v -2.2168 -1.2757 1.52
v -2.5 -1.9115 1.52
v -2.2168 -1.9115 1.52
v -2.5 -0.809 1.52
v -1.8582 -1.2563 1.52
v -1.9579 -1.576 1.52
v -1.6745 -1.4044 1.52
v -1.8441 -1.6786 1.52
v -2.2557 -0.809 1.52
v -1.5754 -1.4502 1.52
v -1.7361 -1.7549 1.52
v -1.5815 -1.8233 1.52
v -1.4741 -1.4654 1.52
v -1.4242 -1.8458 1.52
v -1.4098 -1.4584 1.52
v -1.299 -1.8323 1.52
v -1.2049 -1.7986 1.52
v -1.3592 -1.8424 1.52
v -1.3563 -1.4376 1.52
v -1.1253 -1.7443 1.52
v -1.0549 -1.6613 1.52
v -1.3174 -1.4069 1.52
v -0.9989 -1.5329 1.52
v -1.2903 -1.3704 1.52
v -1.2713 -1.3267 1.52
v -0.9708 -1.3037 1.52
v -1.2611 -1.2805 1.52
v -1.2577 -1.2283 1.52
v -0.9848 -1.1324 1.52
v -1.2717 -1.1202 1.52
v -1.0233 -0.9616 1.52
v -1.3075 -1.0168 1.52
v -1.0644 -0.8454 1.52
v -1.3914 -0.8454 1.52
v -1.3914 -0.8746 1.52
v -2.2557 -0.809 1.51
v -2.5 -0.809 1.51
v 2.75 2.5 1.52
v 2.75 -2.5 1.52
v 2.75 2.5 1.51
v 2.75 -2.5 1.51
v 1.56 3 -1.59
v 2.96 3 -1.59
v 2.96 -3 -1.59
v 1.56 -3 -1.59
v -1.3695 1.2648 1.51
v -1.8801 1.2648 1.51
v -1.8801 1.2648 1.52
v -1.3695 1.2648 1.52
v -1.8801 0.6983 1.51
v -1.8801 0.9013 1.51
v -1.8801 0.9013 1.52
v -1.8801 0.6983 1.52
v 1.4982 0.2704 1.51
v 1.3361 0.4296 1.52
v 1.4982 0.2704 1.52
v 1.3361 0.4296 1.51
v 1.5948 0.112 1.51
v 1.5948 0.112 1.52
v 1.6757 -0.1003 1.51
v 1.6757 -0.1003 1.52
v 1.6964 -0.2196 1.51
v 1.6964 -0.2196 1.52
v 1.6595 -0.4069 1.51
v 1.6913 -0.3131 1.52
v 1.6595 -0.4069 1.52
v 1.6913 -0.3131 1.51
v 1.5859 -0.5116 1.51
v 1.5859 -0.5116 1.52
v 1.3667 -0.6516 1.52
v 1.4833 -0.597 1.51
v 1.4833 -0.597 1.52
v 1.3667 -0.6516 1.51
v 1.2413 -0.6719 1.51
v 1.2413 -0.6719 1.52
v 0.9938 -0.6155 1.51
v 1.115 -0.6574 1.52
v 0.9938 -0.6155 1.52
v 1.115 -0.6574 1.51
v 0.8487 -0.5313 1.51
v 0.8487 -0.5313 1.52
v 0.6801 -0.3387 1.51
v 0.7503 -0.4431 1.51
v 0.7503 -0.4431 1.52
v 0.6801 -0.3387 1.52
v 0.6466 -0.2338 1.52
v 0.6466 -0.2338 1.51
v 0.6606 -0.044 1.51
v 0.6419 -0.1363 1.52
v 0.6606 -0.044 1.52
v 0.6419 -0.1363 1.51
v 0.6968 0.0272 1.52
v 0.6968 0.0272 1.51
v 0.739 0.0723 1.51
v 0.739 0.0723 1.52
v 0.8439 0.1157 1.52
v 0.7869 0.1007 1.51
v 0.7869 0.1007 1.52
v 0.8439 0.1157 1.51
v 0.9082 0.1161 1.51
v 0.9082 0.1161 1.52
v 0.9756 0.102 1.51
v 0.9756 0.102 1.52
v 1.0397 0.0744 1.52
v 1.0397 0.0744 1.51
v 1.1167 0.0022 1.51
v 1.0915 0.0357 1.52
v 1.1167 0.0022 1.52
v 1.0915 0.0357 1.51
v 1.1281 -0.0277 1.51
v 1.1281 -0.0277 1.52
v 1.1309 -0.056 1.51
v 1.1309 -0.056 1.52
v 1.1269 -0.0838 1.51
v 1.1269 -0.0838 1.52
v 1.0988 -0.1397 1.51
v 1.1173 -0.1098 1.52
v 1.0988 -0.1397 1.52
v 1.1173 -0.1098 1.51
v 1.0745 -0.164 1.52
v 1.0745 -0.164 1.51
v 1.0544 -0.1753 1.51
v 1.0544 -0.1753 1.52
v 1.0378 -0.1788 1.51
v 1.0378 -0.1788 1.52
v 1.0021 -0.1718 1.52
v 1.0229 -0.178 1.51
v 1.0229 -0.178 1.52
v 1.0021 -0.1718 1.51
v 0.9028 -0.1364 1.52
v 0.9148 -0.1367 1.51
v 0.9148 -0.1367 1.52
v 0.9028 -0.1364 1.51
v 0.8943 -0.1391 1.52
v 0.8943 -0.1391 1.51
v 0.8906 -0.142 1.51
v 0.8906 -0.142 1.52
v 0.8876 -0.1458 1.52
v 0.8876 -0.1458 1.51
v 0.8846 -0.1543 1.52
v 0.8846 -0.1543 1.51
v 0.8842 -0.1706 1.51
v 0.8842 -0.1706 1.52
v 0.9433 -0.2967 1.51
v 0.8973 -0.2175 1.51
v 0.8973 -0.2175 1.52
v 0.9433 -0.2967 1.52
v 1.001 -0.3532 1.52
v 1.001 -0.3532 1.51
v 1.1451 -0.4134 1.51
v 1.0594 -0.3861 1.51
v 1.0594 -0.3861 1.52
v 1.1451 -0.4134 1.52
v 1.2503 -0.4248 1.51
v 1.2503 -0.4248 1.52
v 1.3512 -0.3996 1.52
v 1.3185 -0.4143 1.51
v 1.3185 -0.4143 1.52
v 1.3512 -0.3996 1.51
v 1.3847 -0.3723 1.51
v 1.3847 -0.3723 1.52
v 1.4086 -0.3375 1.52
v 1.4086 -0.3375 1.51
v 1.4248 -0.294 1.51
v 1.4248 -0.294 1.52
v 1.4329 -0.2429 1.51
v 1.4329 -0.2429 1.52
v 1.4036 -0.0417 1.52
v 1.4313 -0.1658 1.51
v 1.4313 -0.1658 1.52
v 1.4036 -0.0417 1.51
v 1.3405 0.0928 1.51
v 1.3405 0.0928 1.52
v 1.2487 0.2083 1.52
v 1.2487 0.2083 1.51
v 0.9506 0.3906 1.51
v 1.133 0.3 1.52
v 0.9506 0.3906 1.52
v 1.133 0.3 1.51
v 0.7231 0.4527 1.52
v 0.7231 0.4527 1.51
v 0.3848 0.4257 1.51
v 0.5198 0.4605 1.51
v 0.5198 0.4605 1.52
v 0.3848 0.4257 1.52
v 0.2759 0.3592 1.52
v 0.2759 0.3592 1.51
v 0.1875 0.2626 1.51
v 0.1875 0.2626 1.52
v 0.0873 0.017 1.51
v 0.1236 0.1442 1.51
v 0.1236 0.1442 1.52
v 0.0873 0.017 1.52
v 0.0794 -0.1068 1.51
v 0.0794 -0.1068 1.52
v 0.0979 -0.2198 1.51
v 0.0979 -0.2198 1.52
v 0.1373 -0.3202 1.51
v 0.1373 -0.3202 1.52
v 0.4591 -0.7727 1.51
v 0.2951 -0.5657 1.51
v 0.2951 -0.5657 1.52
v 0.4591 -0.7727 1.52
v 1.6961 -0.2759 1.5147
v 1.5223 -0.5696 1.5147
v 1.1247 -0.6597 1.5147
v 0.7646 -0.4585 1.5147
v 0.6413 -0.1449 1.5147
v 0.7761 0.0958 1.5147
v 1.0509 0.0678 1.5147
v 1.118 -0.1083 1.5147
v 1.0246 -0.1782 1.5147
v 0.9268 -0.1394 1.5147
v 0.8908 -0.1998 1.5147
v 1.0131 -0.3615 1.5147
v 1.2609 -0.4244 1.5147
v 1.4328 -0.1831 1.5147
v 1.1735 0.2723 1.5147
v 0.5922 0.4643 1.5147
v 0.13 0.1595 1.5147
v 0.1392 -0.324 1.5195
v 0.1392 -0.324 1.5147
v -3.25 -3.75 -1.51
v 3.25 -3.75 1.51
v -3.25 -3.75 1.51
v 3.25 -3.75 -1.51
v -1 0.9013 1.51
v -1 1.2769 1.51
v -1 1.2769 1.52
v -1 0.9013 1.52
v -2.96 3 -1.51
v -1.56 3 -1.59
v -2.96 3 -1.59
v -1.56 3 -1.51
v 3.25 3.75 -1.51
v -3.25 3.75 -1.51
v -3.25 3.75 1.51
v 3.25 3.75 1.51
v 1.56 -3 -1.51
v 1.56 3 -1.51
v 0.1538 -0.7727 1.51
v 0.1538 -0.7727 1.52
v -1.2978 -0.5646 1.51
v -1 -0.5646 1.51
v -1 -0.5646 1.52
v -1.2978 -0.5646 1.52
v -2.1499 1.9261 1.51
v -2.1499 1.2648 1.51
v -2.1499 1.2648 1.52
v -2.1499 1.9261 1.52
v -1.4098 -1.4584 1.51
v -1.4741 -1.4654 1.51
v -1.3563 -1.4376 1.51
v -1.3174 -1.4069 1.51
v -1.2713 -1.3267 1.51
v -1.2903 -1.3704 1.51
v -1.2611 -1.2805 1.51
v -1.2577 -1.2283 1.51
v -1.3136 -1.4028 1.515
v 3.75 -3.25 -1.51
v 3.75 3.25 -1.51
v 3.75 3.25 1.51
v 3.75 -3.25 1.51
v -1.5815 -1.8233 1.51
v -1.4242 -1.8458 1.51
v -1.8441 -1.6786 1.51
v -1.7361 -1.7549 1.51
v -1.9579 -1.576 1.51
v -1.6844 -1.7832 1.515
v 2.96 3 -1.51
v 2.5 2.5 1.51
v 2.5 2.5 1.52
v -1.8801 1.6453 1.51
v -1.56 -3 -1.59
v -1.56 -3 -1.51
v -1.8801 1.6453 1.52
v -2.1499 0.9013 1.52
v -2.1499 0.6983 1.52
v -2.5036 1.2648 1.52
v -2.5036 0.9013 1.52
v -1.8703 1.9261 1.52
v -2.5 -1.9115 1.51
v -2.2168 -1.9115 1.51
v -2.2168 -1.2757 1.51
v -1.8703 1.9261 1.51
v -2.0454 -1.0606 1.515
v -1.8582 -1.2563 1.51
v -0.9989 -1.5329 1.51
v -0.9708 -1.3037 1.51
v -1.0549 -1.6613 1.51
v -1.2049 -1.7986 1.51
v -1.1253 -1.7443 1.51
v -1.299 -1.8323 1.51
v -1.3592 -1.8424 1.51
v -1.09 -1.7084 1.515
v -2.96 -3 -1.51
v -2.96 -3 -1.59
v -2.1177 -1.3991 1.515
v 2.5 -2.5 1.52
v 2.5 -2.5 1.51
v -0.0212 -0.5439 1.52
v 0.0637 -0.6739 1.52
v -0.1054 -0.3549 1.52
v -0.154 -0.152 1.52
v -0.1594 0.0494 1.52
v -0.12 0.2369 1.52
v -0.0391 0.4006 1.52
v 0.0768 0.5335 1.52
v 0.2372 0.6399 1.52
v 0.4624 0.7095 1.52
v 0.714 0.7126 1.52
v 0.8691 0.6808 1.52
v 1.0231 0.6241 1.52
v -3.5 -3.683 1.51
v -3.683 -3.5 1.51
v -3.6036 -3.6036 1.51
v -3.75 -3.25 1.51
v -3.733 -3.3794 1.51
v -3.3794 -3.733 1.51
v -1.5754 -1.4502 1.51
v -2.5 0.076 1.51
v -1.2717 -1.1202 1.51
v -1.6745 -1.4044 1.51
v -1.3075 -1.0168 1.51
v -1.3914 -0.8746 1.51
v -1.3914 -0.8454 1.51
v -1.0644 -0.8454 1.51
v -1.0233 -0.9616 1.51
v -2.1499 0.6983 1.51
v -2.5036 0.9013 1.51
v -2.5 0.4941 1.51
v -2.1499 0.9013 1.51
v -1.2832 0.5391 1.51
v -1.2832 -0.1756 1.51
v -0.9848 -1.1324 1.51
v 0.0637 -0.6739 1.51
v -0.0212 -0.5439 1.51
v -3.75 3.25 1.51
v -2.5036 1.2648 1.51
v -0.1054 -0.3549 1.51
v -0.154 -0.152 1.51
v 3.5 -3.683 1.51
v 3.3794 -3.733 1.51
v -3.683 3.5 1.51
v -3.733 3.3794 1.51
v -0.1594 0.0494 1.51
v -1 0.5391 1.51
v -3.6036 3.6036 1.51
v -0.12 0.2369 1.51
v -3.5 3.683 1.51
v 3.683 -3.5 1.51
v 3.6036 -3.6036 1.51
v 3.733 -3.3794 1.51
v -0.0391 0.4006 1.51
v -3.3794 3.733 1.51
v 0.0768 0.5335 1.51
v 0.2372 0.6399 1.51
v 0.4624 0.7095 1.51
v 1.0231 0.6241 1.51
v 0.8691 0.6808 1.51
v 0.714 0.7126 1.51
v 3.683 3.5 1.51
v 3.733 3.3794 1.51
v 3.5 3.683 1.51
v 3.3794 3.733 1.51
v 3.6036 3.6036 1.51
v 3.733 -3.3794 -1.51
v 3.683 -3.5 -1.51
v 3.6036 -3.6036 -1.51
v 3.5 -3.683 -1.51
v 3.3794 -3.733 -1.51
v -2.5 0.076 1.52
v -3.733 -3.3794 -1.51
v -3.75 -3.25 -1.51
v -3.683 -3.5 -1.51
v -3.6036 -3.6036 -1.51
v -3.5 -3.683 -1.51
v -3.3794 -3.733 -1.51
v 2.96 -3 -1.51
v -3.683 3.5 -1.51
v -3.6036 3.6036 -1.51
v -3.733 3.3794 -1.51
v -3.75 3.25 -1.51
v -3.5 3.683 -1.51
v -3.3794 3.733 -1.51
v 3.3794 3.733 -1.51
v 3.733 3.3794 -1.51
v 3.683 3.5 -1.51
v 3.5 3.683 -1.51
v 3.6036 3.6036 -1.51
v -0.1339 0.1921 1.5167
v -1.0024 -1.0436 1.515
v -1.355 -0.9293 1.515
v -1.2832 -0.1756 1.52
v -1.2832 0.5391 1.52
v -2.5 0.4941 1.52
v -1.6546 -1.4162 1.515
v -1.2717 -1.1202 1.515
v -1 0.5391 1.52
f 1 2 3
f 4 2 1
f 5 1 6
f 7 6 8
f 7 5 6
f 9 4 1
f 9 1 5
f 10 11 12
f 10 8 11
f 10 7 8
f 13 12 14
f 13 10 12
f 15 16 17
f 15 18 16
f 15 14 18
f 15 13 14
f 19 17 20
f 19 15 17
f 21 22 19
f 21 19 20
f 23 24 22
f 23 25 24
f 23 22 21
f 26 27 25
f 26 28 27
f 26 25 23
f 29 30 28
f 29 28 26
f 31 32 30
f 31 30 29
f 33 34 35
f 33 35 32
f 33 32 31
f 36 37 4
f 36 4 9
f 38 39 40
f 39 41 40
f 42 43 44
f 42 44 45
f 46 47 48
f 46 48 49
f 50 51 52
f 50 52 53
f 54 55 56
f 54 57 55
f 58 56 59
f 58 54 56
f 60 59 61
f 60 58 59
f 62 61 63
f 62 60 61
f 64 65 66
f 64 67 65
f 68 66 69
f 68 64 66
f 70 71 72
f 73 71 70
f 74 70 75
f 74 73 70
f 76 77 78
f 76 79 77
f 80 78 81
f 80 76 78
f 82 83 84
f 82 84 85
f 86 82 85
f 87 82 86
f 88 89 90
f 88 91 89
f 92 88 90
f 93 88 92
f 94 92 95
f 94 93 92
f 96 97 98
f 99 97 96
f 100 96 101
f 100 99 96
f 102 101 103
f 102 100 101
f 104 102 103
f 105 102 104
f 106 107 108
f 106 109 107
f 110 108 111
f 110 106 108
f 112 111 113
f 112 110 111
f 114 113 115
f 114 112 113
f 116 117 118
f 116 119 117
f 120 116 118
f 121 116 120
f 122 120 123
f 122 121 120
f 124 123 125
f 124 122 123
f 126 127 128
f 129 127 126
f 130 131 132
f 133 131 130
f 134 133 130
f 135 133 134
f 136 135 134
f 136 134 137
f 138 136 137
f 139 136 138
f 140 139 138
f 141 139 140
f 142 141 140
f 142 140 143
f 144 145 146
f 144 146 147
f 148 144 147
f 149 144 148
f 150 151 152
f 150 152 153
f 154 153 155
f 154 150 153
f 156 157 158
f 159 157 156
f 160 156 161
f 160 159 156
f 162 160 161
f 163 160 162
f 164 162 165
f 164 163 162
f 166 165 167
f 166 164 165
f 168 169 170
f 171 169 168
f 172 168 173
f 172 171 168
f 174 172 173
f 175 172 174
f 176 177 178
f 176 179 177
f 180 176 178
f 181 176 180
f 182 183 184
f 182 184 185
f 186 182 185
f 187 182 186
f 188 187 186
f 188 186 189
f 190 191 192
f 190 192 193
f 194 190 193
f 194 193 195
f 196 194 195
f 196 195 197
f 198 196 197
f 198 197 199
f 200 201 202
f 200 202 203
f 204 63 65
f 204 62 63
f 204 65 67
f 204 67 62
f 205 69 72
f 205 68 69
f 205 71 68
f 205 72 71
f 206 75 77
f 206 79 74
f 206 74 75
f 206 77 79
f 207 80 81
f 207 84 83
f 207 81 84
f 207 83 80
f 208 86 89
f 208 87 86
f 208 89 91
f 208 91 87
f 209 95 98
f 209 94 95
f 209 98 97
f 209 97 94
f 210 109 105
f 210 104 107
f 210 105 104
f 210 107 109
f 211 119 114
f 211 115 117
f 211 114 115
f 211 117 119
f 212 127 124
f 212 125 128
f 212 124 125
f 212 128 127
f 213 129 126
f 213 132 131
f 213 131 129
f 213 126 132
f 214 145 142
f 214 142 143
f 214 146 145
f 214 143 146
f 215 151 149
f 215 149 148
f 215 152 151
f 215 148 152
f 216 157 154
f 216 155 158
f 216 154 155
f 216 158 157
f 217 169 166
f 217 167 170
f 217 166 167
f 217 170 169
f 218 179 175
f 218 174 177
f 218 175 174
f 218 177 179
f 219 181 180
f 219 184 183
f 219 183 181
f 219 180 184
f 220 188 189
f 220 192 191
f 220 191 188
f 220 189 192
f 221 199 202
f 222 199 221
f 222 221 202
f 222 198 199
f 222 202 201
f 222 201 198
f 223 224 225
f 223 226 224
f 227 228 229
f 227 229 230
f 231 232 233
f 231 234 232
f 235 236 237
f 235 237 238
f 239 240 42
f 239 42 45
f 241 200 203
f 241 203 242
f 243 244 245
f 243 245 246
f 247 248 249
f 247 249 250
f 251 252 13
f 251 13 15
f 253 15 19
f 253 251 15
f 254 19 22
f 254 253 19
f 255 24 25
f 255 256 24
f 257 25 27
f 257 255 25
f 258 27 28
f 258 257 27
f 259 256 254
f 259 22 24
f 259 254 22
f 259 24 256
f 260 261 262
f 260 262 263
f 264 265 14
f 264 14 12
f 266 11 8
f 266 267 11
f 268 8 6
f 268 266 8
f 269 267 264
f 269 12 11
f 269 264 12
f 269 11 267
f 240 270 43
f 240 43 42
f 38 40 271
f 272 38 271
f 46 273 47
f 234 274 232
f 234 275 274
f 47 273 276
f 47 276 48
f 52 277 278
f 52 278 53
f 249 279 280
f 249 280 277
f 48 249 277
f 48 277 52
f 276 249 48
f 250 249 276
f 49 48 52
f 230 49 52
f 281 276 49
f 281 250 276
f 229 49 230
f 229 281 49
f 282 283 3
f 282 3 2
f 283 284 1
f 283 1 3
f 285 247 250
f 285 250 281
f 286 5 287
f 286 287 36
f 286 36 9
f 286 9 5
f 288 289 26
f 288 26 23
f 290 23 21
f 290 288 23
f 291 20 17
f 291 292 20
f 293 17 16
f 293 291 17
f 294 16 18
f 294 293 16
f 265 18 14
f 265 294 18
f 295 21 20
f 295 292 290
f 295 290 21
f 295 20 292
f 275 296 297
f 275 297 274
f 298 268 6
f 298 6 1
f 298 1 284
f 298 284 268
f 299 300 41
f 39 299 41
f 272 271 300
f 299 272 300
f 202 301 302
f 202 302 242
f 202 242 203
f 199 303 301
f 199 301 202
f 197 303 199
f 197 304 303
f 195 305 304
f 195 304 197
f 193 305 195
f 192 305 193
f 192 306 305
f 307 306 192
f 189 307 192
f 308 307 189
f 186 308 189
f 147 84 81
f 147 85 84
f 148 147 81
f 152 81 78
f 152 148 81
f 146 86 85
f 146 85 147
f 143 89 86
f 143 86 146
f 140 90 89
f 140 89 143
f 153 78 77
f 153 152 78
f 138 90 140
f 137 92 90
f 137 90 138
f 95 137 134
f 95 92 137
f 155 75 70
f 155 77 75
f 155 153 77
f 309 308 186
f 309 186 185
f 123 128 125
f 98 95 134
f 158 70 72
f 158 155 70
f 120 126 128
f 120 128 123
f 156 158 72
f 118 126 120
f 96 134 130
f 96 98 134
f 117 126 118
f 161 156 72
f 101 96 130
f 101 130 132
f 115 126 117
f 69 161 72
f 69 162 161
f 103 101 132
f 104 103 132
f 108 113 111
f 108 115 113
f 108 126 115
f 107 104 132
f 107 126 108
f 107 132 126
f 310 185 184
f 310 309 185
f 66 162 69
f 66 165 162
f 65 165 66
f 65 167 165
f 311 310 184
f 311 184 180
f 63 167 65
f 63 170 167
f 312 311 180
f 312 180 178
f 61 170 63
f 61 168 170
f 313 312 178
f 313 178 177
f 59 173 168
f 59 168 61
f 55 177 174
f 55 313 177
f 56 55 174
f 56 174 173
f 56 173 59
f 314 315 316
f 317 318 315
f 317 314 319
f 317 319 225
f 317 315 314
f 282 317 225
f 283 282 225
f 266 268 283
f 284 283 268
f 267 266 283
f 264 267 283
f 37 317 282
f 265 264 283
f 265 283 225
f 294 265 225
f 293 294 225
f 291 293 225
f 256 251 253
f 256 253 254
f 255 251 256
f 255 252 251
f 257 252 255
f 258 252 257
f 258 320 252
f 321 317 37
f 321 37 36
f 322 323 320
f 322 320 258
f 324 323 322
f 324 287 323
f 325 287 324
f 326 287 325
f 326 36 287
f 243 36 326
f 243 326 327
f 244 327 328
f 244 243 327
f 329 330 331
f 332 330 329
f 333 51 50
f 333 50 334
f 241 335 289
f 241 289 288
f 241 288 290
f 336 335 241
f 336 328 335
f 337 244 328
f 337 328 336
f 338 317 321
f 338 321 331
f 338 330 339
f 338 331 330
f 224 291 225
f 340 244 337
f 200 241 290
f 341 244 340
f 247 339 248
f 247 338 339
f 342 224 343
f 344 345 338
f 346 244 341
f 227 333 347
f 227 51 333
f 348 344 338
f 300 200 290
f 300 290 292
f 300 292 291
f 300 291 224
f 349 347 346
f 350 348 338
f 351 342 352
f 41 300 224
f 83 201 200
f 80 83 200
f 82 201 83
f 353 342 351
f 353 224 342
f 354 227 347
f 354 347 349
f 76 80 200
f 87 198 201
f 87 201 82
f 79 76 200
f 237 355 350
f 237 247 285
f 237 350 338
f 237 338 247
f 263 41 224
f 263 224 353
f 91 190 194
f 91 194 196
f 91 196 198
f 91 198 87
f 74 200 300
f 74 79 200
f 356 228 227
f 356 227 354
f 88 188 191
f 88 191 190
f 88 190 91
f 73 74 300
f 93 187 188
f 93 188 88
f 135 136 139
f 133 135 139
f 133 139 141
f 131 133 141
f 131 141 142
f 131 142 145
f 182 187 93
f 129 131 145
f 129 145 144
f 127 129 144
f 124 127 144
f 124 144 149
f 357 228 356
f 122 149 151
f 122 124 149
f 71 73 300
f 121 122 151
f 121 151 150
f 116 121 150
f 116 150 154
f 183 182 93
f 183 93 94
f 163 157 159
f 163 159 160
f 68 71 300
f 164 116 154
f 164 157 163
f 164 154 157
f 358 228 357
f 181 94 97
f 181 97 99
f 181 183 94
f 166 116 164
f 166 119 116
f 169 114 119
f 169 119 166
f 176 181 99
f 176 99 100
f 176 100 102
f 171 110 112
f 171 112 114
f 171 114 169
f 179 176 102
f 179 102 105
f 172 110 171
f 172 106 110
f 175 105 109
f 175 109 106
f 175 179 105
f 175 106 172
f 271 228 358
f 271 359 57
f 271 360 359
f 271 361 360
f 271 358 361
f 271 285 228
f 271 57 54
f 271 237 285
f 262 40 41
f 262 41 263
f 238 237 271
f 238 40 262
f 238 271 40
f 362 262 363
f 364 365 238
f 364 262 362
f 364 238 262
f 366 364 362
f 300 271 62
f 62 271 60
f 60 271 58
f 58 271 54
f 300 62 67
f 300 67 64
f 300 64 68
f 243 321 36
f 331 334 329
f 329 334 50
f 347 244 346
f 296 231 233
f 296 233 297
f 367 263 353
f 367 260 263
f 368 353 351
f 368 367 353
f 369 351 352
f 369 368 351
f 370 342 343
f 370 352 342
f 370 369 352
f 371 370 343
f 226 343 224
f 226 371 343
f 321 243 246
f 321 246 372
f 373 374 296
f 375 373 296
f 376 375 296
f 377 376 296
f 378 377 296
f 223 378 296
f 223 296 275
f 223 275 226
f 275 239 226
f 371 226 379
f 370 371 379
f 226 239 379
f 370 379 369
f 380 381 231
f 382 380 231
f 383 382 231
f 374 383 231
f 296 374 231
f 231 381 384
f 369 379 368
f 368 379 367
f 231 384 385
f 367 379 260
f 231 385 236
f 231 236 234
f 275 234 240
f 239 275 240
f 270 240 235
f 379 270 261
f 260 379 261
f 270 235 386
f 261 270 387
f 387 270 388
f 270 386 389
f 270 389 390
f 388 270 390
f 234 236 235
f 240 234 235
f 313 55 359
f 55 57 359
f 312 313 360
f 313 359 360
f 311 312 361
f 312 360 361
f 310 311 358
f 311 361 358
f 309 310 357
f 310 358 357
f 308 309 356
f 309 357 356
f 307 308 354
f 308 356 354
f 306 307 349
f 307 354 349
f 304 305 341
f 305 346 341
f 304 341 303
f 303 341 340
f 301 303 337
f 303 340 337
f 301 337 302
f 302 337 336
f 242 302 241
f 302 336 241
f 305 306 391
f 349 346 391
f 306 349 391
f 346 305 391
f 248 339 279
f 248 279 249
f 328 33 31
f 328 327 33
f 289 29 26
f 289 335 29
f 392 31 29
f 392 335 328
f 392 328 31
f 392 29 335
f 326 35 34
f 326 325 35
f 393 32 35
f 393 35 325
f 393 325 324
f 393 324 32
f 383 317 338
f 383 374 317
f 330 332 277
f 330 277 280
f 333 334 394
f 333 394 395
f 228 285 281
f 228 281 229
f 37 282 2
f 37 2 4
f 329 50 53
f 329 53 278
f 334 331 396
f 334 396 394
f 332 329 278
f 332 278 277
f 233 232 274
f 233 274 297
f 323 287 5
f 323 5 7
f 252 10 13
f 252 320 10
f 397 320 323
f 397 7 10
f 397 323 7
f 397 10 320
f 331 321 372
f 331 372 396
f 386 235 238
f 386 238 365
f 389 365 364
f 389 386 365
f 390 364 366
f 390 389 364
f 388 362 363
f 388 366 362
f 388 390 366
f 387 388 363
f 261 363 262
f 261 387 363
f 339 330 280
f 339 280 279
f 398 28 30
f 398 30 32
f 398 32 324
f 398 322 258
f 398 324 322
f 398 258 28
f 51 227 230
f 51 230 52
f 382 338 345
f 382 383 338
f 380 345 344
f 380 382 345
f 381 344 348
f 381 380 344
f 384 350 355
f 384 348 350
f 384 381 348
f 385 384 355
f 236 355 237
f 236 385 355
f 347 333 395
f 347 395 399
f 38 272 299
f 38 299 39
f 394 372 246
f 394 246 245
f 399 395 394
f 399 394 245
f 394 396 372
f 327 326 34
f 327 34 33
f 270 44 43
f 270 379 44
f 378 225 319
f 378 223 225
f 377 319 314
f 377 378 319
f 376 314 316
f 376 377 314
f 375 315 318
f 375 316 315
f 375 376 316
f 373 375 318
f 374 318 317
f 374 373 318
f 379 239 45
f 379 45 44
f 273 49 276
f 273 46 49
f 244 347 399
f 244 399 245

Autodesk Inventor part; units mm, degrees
ref_plane "YZ Plane" through (0, 0, 0) normal (1, 0, 0) x (0, 1, 0)
ref_plane "XZ Plane" through (0, 0, 0) normal (0, 1, 0) x (-1, 0, 0)
ref_plane "XY Plane" through (0, 0, 0) normal (0, 0, 1) x (1, 0, 0)
sketch "Sketch1" plane through (0, 0, 0) normal (0, 0, 1) x (1, 0, 0)
  line L0 (3.25, -3.75) -> (-3.25, -3.75)
  line L1 (-3.75, -3.25) -> (-3.75, 3.25)
  line L2 (-3.25, 3.75) -> (3.25, 3.75)
  line L3 (3.75, 3.25) -> (3.75, -3.25)
  line L4 (3.75, -3.75) -> (-3.75, 3.75) construction
  line L5 (-3.75, -3.75) -> (3.75, 3.75) construction
  arc A0 (-3.25, 3.75) -> (-3.75, 3.25) centre (-3.25, 3.25) ccw
  arc A1 (-3.75, -3.25) -> (-3.25, -3.75) centre (-3.25, -3.25) ccw
  arc A2 (3.25, -3.75) -> (3.75, -3.25) centre (3.25, -3.25) ccw
  arc A3 (3.75, 3.25) -> (3.25, 3.75) centre (3.25, 3.25) ccw
  point P0 (0, 0)
  dimension "d0" = 7.5
  dimension "d1" = 0.5
extrude "Extrusion1" add sketch "Sketch1" along normal mid plane 3.02
sketch "Sketch2" plane through (0, 0, -1.51) normal (0, 0, -1) x (-1, 0, 0)
  line L0 (2.96, -3) -> (1.56, -3)
  line L1 (1.56, -3) -> (1.56, 3)
  line L2 (1.56, 3) -> (2.96, 3)
  line L3 (2.96, 3) -> (2.96, -3)
  line L4 (-1.56, -3) -> (-2.96, -3)
  line L5 (-2.96, -3) -> (-2.96, 3)
  line L6 (-2.96, 3) -> (-1.56, 3)
  line L7 (-1.56, 3) -> (-1.56, -3)
  line L8 (0, -3) -> (0, 3) construction
  point P0 (0, 0)
  point P1 (0, 0)
  dimension "d4" = 1.4
  dimension "d5" = 6
  dimension "d6" = 3.12
extrude "Extrusion2" add sketch "Sketch2" along normal blind 0.08
sketch "Sketch3" plane through (0, 0, 1.51) normal (0, 0, 1) x (1, 0, 0)
  line L0 (2.75, 2.5) -> (2.5, 2.5)
  line L1 (2.5, 2.5) -> (2.5, -2.5)
  line L2 (2.5, -2.5) -> (2.75, -2.5)
  line L3 (2.75, -2.5) -> (2.75, 2.5)
  line L4 (-2.5, 2.5) -> (-2.5, -2.5) construction
  spline S0 degree 4 poles (1.3361, 0.4296) (1.5722, 0.2536) (1.6111, 0.0081) (1.8752, -0.3041) (1.3349, -0.7643) (0.9016, -0.6061) (0.6086, -0.3512) (0.6279, 0.0301) (0.8528, 0.1857) (1.2221, 0.0137) (1.0663, -0.2096) (0.9971, -0.1716) (0.8339, -0.0827) (0.9372, -0.3475) (1.124, -0.4244) (1.5104, -0.4795) (1.4218, 0.1865) (0.9203, 0.4463) (0.2397, 0.5724) (-0.0703, -0.2361) (0.2655, -0.4716) (0.366, -0.6909) (0.4591, -0.7727) knots 0 0 0 0 0 0.123761 0.174234 0.226685 0.279962 0.33014 0.377129 0.419078 0.455262 0.487036 0.514913 0.545248 0.580512 0.622872 0.674906 0.733244 0.796807 0.860625 0.919671 1 1 1 1 1
  line L5 (0.3021, -0.6347) -> (0.6161, -0.9108) construction
  arc A0 (0.3672, -0.6474) -> (0.5952, -0.8479) centre (0.698, -0.5011) ccw construction
  spline S1 degree 4 poles (1.3361, 0.4296) (1.1748, 0.5523) (0.7861, 0.8379) (-0.1178, 0.7487) (-0.2762, -0.1647) (0.0057, -0.6403) (0.1538, -0.7727) knots 0 0 0 0 0 0.46045 0.670358 1 1 1 1 1
  line L6 (-0.0024, -0.6331) -> (0.3101, -0.9124) construction
  arc A1 (0.0518, -0.6477) -> (0.2895, -0.8602) centre (0.4983, -0.3874) ccw construction
  line L7 (0.4591, -0.7727) -> (0.1538, -0.7727)
  line L8 (1.4819, -0.2272) -> (1.2942, 0.2269) construction
  arc A2 (1.4343, -0.1846) -> (1.2905, 0.1631) centre (0.7871, -0.2485) ccw construction
  line L9 (-2.1499, 0.6983) -> (-2.1499, 0.9013)
  line L10 (-2.1499, 0.9013) -> (-2.5036, 0.9013)
  line L11 (-2.5036, 0.9013) -> (-2.5036, 1.2648)
  line L12 (-2.5036, 1.2648) -> (-2.1499, 1.2648)
  line L13 (-2.1499, 1.2648) -> (-2.1499, 1.9261)
  line L14 (-2.1499, 1.9261) -> (-1.8703, 1.9261)
  line L15 (-1.8703, 1.9261) -> (-1, 1.2769)
  line L16 (-1, 1.2769) -> (-1, 0.9013)
  line L17 (-1, 0.9013) -> (-1.8801, 0.9013)
  line L18 (-1.8801, 0.9013) -> (-1.8801, 0.6983)
  line L19 (-1.8801, 0.6983) -> (-2.1499, 0.6983)
  line L20 (-1.8801, 1.2648) -> (-1.3695, 1.2648)
  line L21 (-1.3695, 1.2648) -> (-1.8801, 1.6453)
  line L22 (-1.8801, 1.6453) -> (-1.8801, 1.2648)
  line L23 (-1.2978, -0.5646) -> (-2.5, 0.076)
  line L24 (-2.5, 0.076) -> (-2.5, 0.4941)
  line L25 (-2.5, 0.4941) -> (-1.2832, -0.1756)
  line L26 (-1.2832, -0.1756) -> (-1.2832, 0.5391)
  line L27 (-1.2832, 0.5391) -> (-1, 0.5391)
  line L28 (-1, 0.5391) -> (-1, -0.5646)
  line L29 (-1, -0.5646) -> (-1.2978, -0.5646)
  line L30 (-2.5, -1.9115) -> (-2.5, -0.809)
  line L31 (-2.5, -0.809) -> (-2.2557, -0.809)
  spline S2 degree 2 poles (-2.2557, -0.809) (-2.1438, -0.9487) (-1.9469, -1.1724) (-1.8582, -1.2563) knots 0 0 0 1 2 2 2
  spline S3 degree 2 poles (-1.8582, -1.2563) (-1.7427, -1.3669) (-1.5665, -1.4654) (-1.4741, -1.4654) knots 0 0 0 1 2 2 2
  spline S4 degree 2 poles (-1.4741, -1.4654) (-1.3695, -1.4654) (-1.2577, -1.3402) (-1.2577, -1.2283) knots 0 0 0 1 2 2 2
  spline S5 degree 2 poles (-1.2577, -1.2283) (-1.2577, -1.1712) (-1.2857, -1.0691) (-1.3075, -1.0168) knots 0 0 0 1 2 2 2
  spline S6 degree 2 poles (-1.3075, -1.0168) (-1.3306, -0.9658) (-1.3793, -0.8928) (-1.3914, -0.8746) knots 0 0 0 1 2 2 2
  line L32 (-1.3914, -0.8746) -> (-1.3914, -0.8454)
  line L33 (-1.3914, -0.8454) -> (-1.0644, -0.8454)
  spline S7 degree 2 poles (-1.0644, -0.8454) (-1.034, -0.9086) (-0.9708, -1.1785) (-0.9708, -1.3037) knots 0 0 0 1 2 2 2
  spline S8 degree 2 poles (-0.9708, -1.3037) (-0.9708, -1.5711) (-1.2091, -1.8458) (-1.4242, -1.8458) knots 0 0 0 1 2 2 2
  spline S9 degree 2 poles (-1.4242, -1.8458) (-1.5567, -1.8458) (-1.812, -1.7206) (-1.9579, -1.576) knots 0 0 0 1 2 2 2
  spline S10 degree 2 poles (-1.9579, -1.576) (-2.0478, -1.4848) (-2.1876, -1.3134) (-2.2168, -1.2757) knots 0 0 0 1 2 2 2
  line L34 (-2.2168, -1.2757) -> (-2.2168, -1.9115)
  line L35 (-2.2168, -1.9115) -> (-2.5, -1.9115)
  point P0 (0, 0)
  point P1 (-2.5, 0)
  point P2 (2.5, 0)
  point P3 (1.5897, 0.1222)
  point P4 (1.6836, -0.1324)
  point P5 (1.6666, -0.392)
  point P6 (1.348, -0.657)
  point P7 (0.9064, -0.5696)
  point P8 (0.6595, -0.2864)
  point P9 (0.6874, 0.0129)
  point P10 (0.9152, 0.1153)
  point P11 (1.131, -0.0524)
  point P12 (1.0559, -0.1747)
  point P13 (0.9784, -0.1613)
  point P14 (0.8944, -0.1391)
  point P15 (0.915, -0.2539)
  point P16 (1.1067, -0.4034)
  point P17 (1.3658, -0.3897)
  point P18 (1.3881, -0.0001)
  point P19 (0.911, 0.405)
  point P20 (0.2939, 0.3734)
  point P21 (0.0837, -0.1519)
  point P22 (0.2608, -0.5163)
  point P23 (1.0376, 0.6174)
  point P24 (0.5316, 0.7174)
  point P25 (0.0302, 0.4881)
  point P26 (-0.1564, -0.1329)
  dimension "d9" = 5
  dimension "d10" = 0.25
  dimension "d11" = 2.5
  dimension "d12" = 2.5
extrude "Extrusion3" add sketch "Sketch3" along normal blind 0.01
equation "\"d12\" = d11"
properties part number "Inductor_7575" material "Steel, Carbon"
